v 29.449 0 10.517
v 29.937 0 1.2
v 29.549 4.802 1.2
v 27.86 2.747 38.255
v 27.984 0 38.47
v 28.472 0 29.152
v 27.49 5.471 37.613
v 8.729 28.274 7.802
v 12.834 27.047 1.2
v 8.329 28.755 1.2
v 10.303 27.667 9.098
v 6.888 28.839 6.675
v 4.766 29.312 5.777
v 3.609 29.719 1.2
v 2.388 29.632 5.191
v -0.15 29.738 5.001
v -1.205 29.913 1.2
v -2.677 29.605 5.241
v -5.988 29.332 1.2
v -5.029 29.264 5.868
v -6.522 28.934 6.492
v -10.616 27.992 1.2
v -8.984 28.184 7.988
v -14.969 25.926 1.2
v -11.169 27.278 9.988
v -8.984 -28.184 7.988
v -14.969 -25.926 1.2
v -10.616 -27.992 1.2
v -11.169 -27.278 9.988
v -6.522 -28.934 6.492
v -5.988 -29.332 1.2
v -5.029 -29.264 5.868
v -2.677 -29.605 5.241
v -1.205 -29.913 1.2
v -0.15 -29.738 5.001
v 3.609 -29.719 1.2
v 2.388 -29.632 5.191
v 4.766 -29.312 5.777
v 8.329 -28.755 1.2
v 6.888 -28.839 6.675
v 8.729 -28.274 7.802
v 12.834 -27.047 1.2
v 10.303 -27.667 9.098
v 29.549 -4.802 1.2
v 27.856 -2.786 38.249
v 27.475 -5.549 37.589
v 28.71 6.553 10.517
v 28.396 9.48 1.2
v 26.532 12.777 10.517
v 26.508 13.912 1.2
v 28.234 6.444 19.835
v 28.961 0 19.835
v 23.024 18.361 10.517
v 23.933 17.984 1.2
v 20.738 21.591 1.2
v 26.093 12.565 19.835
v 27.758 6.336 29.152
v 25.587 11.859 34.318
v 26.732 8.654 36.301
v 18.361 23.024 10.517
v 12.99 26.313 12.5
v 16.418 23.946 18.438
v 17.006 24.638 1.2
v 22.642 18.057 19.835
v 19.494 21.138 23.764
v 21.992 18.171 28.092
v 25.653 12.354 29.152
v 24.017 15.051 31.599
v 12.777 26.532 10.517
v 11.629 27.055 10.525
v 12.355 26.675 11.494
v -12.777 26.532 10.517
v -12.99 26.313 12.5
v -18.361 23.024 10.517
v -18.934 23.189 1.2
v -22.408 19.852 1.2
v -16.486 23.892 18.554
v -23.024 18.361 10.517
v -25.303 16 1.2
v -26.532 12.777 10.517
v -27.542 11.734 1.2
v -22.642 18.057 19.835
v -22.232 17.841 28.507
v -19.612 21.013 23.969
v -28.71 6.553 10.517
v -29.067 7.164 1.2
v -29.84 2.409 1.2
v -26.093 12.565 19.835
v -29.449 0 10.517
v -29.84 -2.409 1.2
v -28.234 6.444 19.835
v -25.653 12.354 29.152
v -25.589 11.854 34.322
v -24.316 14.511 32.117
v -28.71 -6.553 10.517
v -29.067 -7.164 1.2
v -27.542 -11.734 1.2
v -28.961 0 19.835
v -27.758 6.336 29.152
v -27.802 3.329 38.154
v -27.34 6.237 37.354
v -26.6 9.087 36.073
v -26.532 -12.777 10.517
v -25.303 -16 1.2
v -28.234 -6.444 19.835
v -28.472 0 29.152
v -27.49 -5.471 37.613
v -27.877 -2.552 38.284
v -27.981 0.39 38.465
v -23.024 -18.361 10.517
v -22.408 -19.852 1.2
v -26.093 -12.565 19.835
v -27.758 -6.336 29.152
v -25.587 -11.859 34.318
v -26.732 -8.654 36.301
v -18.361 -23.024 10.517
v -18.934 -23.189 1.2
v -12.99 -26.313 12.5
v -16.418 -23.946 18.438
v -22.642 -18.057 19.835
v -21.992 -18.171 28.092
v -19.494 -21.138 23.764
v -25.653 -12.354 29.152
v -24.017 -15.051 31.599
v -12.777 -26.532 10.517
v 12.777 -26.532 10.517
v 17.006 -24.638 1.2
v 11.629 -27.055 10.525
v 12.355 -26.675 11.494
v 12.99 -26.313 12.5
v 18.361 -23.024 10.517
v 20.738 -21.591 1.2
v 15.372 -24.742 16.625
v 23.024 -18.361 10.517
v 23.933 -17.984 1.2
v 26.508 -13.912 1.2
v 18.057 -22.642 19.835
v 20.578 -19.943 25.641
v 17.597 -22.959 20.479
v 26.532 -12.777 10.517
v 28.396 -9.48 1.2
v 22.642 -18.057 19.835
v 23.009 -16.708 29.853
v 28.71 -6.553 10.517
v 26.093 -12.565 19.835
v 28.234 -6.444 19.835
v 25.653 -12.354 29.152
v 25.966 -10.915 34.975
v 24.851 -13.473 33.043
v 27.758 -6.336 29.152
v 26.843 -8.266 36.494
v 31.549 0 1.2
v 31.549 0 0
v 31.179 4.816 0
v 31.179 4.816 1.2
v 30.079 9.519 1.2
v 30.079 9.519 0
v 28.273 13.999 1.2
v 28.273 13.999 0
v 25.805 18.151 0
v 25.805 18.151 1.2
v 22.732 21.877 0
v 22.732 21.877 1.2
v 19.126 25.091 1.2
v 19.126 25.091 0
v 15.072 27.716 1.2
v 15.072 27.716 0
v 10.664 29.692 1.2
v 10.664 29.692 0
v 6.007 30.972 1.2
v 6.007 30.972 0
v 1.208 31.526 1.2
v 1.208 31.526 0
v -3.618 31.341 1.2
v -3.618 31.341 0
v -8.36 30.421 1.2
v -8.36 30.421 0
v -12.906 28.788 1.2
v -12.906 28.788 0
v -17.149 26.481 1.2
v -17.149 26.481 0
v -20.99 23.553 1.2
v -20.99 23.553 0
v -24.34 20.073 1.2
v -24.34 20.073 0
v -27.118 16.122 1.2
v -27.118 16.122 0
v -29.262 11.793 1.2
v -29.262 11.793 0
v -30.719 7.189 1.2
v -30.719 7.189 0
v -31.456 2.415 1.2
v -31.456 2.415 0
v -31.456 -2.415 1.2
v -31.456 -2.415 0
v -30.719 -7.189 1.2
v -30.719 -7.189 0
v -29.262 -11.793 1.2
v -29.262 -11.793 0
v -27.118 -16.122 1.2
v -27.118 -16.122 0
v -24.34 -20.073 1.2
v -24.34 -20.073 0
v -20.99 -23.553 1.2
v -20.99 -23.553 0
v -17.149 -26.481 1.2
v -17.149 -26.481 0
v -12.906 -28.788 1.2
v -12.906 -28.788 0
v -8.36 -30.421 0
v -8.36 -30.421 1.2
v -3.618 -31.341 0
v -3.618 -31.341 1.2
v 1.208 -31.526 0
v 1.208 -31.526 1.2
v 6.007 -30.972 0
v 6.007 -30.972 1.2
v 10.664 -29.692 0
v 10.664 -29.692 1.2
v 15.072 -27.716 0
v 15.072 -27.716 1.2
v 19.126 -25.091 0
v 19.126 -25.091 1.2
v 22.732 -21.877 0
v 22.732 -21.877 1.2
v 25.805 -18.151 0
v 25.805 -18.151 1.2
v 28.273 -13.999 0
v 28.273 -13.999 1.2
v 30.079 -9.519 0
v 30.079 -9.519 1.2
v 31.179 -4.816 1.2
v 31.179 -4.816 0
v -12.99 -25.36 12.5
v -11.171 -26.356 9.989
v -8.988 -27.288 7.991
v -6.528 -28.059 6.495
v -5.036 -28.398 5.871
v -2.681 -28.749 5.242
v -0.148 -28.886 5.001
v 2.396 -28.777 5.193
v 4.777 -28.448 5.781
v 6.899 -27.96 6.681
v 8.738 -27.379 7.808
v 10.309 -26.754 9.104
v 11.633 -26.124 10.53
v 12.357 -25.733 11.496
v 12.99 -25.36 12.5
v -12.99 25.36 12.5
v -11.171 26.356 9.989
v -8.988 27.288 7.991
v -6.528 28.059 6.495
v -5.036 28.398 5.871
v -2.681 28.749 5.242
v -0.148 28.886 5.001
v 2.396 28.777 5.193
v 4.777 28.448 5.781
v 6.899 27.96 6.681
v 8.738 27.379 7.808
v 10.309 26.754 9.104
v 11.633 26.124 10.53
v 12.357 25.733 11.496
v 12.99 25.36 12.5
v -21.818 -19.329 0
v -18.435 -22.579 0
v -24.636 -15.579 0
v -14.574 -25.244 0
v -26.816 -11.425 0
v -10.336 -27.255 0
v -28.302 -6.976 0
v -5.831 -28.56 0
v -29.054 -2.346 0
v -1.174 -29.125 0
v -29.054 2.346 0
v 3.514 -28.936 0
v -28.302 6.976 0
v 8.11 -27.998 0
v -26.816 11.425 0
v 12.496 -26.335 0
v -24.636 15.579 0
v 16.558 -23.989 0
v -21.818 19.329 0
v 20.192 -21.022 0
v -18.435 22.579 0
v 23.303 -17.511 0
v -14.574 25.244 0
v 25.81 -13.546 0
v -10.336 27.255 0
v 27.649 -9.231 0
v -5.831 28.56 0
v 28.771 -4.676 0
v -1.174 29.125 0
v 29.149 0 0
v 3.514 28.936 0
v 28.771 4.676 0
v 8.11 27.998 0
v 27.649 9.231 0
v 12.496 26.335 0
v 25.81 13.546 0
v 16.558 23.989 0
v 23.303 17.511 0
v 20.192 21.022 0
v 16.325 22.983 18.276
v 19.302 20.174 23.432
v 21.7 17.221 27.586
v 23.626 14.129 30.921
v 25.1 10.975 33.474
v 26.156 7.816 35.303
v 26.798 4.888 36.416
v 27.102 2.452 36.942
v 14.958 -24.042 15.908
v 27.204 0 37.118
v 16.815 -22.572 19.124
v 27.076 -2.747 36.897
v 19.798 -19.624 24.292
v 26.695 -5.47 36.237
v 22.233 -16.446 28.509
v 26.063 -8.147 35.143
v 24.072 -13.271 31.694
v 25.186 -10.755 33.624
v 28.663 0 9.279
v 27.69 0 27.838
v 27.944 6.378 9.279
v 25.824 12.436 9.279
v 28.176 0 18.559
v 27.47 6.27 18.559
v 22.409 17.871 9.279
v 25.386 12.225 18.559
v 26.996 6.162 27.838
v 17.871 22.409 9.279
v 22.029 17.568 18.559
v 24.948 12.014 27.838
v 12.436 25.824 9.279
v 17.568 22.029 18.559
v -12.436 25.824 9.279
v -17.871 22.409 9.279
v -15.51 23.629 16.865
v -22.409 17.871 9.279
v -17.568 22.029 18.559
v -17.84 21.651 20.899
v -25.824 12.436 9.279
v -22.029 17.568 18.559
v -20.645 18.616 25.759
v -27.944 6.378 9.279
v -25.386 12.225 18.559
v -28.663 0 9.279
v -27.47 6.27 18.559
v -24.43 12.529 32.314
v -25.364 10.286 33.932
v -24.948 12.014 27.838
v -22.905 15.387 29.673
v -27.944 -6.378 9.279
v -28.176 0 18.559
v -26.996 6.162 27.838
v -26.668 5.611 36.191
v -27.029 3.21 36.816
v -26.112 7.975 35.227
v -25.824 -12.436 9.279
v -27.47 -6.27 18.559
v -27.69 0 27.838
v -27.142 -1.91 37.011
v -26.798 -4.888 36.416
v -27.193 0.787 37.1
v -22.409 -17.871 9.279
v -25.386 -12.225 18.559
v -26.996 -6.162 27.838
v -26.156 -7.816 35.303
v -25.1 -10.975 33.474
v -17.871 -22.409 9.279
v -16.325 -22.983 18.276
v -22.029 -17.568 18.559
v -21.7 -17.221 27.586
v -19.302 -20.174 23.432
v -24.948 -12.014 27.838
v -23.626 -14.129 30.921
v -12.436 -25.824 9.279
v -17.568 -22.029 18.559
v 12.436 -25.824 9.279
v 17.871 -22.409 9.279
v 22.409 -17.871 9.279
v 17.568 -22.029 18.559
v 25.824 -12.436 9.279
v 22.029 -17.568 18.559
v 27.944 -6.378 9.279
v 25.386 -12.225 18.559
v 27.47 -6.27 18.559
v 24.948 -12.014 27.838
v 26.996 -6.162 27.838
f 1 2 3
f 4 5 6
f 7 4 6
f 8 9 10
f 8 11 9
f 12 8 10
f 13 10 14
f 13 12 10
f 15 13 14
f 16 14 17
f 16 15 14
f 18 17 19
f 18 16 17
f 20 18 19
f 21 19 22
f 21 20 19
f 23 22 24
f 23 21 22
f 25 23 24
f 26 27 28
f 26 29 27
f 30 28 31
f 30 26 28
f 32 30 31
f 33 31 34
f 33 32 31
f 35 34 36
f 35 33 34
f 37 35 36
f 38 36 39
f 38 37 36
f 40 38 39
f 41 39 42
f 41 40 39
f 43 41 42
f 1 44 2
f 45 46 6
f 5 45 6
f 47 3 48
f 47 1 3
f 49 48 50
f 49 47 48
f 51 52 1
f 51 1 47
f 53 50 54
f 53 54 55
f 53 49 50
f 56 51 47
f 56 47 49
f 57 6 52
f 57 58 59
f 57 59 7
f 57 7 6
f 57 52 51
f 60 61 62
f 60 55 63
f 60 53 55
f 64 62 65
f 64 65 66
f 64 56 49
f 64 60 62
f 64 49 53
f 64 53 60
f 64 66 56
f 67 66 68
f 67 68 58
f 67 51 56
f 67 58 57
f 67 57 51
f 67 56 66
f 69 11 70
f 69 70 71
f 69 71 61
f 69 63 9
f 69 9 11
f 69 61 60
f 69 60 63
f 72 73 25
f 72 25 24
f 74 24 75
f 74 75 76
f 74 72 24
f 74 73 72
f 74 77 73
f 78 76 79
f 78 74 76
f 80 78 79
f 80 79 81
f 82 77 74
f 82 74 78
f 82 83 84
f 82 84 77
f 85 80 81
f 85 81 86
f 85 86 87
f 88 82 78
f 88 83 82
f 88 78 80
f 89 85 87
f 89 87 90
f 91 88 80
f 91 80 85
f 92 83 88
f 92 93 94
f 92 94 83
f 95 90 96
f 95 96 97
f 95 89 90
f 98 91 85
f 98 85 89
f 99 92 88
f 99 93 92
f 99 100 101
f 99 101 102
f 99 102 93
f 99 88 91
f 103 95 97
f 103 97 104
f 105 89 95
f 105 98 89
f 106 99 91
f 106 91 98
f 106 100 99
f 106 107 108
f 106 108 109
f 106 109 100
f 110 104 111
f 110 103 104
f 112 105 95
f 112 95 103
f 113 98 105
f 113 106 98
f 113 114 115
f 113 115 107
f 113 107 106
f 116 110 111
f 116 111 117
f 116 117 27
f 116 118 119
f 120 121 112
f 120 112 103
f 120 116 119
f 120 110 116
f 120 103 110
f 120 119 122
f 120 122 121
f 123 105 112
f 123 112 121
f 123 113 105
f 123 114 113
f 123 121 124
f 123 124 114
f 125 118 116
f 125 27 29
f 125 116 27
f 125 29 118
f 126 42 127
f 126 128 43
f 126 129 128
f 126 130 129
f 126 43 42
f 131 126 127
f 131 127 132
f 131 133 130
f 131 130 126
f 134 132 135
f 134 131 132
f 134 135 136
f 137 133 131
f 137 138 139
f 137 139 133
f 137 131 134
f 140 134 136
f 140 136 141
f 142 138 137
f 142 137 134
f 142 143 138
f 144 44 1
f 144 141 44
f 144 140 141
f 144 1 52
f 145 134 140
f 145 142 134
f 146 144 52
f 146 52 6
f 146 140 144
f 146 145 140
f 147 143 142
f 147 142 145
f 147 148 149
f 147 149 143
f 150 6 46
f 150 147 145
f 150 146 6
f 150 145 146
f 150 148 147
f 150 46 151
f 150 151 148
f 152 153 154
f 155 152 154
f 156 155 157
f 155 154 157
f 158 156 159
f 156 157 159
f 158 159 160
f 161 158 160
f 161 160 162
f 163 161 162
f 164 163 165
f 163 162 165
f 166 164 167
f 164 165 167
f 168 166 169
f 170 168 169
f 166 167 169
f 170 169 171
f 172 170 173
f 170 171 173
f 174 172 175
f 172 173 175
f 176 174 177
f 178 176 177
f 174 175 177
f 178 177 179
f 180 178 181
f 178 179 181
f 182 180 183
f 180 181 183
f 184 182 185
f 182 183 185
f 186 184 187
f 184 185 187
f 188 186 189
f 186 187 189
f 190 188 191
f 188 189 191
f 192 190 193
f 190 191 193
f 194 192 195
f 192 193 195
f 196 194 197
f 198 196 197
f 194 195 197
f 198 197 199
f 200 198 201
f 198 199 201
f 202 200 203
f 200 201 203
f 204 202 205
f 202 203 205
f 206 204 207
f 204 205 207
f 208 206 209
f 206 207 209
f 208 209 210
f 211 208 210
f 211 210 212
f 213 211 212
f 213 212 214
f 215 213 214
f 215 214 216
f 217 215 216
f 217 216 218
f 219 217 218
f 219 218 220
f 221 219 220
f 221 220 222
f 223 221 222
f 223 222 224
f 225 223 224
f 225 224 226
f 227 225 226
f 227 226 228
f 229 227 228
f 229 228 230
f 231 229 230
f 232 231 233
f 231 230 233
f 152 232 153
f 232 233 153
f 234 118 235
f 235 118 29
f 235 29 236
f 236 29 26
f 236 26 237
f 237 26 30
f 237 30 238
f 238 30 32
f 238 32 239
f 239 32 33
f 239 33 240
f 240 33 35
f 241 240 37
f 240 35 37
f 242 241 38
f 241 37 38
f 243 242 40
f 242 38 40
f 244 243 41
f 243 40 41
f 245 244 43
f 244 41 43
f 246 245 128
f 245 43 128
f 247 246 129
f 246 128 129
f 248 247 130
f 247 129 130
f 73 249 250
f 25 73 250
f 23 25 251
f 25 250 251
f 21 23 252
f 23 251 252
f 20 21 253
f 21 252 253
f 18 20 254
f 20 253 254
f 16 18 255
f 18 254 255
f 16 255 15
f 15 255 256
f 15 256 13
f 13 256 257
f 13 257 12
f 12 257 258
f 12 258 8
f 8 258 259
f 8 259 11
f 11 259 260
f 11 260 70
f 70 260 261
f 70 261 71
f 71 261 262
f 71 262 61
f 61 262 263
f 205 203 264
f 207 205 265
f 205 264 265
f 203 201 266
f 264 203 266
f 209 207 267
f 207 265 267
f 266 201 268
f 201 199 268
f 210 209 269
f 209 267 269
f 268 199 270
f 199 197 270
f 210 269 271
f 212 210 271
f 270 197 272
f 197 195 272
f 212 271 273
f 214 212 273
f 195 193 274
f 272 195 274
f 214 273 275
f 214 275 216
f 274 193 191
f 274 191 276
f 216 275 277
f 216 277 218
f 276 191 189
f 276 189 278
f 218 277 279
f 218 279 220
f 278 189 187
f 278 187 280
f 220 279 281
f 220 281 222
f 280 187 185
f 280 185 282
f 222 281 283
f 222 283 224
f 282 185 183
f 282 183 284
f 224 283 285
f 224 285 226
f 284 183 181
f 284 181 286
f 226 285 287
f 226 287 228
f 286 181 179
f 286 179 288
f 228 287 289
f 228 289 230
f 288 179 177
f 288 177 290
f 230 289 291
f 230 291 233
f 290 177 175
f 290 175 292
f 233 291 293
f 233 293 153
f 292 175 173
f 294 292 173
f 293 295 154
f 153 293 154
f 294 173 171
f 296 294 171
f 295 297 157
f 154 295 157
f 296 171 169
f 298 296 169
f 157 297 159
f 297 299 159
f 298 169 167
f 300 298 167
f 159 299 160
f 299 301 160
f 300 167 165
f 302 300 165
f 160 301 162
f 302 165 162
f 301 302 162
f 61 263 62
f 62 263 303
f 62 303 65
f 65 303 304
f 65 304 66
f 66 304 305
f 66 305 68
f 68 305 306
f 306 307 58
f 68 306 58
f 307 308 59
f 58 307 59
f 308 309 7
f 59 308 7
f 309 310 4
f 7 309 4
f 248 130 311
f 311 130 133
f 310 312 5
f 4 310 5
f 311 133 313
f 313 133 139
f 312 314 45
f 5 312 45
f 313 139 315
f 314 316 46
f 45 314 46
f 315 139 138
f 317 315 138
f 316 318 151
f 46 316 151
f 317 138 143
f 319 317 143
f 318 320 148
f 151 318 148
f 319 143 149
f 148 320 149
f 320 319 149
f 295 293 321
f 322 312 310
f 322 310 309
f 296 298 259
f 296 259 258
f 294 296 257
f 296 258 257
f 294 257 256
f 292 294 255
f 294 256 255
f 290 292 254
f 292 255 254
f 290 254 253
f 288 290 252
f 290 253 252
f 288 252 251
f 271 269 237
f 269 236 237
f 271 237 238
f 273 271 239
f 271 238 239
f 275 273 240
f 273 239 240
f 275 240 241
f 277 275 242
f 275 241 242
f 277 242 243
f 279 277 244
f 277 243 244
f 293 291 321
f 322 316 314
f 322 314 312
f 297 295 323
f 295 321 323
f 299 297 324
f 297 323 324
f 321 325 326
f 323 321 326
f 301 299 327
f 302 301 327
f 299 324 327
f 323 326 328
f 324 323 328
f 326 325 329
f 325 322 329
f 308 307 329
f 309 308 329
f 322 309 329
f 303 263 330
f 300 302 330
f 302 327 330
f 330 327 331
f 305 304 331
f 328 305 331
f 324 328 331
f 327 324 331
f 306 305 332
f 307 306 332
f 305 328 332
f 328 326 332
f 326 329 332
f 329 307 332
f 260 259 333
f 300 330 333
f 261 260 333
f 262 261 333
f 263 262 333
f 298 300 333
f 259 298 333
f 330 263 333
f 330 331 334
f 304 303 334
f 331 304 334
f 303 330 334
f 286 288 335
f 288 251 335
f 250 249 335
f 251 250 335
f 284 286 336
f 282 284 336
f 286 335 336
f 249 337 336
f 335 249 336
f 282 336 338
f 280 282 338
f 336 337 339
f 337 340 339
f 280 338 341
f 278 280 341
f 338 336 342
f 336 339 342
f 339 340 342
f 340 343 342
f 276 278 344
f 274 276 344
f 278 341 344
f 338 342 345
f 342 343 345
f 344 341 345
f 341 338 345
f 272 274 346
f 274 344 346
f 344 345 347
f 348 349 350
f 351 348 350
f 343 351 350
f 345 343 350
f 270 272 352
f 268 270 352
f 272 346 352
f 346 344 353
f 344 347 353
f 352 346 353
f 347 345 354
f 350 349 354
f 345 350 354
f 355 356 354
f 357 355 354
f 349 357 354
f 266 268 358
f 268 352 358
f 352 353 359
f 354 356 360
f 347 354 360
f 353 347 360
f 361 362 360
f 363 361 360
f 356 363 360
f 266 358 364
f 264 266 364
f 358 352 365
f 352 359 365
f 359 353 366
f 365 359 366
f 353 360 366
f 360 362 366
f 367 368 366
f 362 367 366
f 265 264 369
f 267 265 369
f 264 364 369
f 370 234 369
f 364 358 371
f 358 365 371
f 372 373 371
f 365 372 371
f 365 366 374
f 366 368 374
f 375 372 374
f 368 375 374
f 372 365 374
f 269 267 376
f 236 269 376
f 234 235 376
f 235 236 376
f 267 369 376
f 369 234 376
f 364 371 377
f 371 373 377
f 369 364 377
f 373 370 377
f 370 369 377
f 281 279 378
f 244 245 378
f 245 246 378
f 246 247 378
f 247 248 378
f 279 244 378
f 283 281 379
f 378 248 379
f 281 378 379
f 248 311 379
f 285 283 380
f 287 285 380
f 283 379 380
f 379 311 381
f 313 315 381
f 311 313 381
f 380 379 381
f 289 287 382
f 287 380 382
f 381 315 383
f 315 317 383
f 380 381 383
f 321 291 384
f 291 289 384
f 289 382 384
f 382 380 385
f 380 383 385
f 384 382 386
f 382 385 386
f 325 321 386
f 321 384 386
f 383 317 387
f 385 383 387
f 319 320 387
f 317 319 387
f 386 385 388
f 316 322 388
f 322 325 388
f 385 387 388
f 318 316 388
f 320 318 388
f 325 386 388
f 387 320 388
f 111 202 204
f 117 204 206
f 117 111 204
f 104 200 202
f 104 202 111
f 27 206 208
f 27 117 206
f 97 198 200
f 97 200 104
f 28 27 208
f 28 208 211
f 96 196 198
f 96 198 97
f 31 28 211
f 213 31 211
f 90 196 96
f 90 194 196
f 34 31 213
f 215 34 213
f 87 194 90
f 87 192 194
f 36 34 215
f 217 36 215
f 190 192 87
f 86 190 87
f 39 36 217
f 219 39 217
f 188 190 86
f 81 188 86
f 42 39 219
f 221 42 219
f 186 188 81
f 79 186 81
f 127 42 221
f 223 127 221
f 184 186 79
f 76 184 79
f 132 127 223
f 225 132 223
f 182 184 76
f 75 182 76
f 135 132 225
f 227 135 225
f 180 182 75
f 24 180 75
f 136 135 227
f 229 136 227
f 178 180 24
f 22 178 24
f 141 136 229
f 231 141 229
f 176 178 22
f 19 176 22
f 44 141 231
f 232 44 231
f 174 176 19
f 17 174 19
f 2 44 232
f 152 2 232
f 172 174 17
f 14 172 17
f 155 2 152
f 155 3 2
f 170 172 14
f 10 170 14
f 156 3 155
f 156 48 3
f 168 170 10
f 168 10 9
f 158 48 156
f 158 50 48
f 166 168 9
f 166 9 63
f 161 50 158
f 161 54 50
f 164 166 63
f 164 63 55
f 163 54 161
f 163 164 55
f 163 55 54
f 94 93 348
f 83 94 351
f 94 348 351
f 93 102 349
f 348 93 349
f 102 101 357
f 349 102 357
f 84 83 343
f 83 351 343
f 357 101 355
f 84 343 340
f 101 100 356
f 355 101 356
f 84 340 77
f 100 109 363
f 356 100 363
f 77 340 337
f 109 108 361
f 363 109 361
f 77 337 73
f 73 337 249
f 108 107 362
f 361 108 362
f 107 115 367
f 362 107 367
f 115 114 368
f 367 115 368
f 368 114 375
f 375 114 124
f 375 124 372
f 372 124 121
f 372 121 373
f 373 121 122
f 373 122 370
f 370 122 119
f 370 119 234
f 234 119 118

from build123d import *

# Parameters (mm, degrees)
F0_R     = 30
F1_DEPTH = 40
F1_TAPER = 3
F2_T     = -0.85
F3_R     = 31.5488335059
F3_R_2   = 29.1488335059
F4_DEPTH = 1.2
F6_DEPTH = 32.5


with BuildPart() as f1:
    # F0 (on Top) → F1 (new body)
    with BuildSketch(Plane.XY):
        Circle(F0_R)
    extrude(amount=F1_DEPTH, taper=F1_TAPER)

    # F2
    f2_openings = [f1.faces().sort_by_distance(p)[0] for p in [
        (0, 0, 40),
        (0, 0, 0),
    ]]
    offset(amount=F2_T, openings=f2_openings)

    # F3 (on Top) → F4 (join)
    with BuildSketch(Plane.XY):
        Circle(F3_R)
        Circle(F3_R_2, mode=Mode.SUBTRACT)
    extrude(amount=F4_DEPTH)

    # F5 (on Front) → F6 (cut, symmetric)
    with BuildSketch(Plane.XZ):
        with BuildLine():
            Line((28.8675134595, 40), (-28.8675134595, 40))
            Line((-28.8675134595, 40), (-12.9903810568, 12.5))
            ThreePointArc((-12.9903810568, 12.5), (0, 5), (12.9903810568, 12.5))
            Line((12.9903810568, 12.5), (28.8675134595, 40))
        make_face()
    extrude(amount=F6_DEPTH, both=True, mode=Mode.SUBTRACT)


solid = f1.part
